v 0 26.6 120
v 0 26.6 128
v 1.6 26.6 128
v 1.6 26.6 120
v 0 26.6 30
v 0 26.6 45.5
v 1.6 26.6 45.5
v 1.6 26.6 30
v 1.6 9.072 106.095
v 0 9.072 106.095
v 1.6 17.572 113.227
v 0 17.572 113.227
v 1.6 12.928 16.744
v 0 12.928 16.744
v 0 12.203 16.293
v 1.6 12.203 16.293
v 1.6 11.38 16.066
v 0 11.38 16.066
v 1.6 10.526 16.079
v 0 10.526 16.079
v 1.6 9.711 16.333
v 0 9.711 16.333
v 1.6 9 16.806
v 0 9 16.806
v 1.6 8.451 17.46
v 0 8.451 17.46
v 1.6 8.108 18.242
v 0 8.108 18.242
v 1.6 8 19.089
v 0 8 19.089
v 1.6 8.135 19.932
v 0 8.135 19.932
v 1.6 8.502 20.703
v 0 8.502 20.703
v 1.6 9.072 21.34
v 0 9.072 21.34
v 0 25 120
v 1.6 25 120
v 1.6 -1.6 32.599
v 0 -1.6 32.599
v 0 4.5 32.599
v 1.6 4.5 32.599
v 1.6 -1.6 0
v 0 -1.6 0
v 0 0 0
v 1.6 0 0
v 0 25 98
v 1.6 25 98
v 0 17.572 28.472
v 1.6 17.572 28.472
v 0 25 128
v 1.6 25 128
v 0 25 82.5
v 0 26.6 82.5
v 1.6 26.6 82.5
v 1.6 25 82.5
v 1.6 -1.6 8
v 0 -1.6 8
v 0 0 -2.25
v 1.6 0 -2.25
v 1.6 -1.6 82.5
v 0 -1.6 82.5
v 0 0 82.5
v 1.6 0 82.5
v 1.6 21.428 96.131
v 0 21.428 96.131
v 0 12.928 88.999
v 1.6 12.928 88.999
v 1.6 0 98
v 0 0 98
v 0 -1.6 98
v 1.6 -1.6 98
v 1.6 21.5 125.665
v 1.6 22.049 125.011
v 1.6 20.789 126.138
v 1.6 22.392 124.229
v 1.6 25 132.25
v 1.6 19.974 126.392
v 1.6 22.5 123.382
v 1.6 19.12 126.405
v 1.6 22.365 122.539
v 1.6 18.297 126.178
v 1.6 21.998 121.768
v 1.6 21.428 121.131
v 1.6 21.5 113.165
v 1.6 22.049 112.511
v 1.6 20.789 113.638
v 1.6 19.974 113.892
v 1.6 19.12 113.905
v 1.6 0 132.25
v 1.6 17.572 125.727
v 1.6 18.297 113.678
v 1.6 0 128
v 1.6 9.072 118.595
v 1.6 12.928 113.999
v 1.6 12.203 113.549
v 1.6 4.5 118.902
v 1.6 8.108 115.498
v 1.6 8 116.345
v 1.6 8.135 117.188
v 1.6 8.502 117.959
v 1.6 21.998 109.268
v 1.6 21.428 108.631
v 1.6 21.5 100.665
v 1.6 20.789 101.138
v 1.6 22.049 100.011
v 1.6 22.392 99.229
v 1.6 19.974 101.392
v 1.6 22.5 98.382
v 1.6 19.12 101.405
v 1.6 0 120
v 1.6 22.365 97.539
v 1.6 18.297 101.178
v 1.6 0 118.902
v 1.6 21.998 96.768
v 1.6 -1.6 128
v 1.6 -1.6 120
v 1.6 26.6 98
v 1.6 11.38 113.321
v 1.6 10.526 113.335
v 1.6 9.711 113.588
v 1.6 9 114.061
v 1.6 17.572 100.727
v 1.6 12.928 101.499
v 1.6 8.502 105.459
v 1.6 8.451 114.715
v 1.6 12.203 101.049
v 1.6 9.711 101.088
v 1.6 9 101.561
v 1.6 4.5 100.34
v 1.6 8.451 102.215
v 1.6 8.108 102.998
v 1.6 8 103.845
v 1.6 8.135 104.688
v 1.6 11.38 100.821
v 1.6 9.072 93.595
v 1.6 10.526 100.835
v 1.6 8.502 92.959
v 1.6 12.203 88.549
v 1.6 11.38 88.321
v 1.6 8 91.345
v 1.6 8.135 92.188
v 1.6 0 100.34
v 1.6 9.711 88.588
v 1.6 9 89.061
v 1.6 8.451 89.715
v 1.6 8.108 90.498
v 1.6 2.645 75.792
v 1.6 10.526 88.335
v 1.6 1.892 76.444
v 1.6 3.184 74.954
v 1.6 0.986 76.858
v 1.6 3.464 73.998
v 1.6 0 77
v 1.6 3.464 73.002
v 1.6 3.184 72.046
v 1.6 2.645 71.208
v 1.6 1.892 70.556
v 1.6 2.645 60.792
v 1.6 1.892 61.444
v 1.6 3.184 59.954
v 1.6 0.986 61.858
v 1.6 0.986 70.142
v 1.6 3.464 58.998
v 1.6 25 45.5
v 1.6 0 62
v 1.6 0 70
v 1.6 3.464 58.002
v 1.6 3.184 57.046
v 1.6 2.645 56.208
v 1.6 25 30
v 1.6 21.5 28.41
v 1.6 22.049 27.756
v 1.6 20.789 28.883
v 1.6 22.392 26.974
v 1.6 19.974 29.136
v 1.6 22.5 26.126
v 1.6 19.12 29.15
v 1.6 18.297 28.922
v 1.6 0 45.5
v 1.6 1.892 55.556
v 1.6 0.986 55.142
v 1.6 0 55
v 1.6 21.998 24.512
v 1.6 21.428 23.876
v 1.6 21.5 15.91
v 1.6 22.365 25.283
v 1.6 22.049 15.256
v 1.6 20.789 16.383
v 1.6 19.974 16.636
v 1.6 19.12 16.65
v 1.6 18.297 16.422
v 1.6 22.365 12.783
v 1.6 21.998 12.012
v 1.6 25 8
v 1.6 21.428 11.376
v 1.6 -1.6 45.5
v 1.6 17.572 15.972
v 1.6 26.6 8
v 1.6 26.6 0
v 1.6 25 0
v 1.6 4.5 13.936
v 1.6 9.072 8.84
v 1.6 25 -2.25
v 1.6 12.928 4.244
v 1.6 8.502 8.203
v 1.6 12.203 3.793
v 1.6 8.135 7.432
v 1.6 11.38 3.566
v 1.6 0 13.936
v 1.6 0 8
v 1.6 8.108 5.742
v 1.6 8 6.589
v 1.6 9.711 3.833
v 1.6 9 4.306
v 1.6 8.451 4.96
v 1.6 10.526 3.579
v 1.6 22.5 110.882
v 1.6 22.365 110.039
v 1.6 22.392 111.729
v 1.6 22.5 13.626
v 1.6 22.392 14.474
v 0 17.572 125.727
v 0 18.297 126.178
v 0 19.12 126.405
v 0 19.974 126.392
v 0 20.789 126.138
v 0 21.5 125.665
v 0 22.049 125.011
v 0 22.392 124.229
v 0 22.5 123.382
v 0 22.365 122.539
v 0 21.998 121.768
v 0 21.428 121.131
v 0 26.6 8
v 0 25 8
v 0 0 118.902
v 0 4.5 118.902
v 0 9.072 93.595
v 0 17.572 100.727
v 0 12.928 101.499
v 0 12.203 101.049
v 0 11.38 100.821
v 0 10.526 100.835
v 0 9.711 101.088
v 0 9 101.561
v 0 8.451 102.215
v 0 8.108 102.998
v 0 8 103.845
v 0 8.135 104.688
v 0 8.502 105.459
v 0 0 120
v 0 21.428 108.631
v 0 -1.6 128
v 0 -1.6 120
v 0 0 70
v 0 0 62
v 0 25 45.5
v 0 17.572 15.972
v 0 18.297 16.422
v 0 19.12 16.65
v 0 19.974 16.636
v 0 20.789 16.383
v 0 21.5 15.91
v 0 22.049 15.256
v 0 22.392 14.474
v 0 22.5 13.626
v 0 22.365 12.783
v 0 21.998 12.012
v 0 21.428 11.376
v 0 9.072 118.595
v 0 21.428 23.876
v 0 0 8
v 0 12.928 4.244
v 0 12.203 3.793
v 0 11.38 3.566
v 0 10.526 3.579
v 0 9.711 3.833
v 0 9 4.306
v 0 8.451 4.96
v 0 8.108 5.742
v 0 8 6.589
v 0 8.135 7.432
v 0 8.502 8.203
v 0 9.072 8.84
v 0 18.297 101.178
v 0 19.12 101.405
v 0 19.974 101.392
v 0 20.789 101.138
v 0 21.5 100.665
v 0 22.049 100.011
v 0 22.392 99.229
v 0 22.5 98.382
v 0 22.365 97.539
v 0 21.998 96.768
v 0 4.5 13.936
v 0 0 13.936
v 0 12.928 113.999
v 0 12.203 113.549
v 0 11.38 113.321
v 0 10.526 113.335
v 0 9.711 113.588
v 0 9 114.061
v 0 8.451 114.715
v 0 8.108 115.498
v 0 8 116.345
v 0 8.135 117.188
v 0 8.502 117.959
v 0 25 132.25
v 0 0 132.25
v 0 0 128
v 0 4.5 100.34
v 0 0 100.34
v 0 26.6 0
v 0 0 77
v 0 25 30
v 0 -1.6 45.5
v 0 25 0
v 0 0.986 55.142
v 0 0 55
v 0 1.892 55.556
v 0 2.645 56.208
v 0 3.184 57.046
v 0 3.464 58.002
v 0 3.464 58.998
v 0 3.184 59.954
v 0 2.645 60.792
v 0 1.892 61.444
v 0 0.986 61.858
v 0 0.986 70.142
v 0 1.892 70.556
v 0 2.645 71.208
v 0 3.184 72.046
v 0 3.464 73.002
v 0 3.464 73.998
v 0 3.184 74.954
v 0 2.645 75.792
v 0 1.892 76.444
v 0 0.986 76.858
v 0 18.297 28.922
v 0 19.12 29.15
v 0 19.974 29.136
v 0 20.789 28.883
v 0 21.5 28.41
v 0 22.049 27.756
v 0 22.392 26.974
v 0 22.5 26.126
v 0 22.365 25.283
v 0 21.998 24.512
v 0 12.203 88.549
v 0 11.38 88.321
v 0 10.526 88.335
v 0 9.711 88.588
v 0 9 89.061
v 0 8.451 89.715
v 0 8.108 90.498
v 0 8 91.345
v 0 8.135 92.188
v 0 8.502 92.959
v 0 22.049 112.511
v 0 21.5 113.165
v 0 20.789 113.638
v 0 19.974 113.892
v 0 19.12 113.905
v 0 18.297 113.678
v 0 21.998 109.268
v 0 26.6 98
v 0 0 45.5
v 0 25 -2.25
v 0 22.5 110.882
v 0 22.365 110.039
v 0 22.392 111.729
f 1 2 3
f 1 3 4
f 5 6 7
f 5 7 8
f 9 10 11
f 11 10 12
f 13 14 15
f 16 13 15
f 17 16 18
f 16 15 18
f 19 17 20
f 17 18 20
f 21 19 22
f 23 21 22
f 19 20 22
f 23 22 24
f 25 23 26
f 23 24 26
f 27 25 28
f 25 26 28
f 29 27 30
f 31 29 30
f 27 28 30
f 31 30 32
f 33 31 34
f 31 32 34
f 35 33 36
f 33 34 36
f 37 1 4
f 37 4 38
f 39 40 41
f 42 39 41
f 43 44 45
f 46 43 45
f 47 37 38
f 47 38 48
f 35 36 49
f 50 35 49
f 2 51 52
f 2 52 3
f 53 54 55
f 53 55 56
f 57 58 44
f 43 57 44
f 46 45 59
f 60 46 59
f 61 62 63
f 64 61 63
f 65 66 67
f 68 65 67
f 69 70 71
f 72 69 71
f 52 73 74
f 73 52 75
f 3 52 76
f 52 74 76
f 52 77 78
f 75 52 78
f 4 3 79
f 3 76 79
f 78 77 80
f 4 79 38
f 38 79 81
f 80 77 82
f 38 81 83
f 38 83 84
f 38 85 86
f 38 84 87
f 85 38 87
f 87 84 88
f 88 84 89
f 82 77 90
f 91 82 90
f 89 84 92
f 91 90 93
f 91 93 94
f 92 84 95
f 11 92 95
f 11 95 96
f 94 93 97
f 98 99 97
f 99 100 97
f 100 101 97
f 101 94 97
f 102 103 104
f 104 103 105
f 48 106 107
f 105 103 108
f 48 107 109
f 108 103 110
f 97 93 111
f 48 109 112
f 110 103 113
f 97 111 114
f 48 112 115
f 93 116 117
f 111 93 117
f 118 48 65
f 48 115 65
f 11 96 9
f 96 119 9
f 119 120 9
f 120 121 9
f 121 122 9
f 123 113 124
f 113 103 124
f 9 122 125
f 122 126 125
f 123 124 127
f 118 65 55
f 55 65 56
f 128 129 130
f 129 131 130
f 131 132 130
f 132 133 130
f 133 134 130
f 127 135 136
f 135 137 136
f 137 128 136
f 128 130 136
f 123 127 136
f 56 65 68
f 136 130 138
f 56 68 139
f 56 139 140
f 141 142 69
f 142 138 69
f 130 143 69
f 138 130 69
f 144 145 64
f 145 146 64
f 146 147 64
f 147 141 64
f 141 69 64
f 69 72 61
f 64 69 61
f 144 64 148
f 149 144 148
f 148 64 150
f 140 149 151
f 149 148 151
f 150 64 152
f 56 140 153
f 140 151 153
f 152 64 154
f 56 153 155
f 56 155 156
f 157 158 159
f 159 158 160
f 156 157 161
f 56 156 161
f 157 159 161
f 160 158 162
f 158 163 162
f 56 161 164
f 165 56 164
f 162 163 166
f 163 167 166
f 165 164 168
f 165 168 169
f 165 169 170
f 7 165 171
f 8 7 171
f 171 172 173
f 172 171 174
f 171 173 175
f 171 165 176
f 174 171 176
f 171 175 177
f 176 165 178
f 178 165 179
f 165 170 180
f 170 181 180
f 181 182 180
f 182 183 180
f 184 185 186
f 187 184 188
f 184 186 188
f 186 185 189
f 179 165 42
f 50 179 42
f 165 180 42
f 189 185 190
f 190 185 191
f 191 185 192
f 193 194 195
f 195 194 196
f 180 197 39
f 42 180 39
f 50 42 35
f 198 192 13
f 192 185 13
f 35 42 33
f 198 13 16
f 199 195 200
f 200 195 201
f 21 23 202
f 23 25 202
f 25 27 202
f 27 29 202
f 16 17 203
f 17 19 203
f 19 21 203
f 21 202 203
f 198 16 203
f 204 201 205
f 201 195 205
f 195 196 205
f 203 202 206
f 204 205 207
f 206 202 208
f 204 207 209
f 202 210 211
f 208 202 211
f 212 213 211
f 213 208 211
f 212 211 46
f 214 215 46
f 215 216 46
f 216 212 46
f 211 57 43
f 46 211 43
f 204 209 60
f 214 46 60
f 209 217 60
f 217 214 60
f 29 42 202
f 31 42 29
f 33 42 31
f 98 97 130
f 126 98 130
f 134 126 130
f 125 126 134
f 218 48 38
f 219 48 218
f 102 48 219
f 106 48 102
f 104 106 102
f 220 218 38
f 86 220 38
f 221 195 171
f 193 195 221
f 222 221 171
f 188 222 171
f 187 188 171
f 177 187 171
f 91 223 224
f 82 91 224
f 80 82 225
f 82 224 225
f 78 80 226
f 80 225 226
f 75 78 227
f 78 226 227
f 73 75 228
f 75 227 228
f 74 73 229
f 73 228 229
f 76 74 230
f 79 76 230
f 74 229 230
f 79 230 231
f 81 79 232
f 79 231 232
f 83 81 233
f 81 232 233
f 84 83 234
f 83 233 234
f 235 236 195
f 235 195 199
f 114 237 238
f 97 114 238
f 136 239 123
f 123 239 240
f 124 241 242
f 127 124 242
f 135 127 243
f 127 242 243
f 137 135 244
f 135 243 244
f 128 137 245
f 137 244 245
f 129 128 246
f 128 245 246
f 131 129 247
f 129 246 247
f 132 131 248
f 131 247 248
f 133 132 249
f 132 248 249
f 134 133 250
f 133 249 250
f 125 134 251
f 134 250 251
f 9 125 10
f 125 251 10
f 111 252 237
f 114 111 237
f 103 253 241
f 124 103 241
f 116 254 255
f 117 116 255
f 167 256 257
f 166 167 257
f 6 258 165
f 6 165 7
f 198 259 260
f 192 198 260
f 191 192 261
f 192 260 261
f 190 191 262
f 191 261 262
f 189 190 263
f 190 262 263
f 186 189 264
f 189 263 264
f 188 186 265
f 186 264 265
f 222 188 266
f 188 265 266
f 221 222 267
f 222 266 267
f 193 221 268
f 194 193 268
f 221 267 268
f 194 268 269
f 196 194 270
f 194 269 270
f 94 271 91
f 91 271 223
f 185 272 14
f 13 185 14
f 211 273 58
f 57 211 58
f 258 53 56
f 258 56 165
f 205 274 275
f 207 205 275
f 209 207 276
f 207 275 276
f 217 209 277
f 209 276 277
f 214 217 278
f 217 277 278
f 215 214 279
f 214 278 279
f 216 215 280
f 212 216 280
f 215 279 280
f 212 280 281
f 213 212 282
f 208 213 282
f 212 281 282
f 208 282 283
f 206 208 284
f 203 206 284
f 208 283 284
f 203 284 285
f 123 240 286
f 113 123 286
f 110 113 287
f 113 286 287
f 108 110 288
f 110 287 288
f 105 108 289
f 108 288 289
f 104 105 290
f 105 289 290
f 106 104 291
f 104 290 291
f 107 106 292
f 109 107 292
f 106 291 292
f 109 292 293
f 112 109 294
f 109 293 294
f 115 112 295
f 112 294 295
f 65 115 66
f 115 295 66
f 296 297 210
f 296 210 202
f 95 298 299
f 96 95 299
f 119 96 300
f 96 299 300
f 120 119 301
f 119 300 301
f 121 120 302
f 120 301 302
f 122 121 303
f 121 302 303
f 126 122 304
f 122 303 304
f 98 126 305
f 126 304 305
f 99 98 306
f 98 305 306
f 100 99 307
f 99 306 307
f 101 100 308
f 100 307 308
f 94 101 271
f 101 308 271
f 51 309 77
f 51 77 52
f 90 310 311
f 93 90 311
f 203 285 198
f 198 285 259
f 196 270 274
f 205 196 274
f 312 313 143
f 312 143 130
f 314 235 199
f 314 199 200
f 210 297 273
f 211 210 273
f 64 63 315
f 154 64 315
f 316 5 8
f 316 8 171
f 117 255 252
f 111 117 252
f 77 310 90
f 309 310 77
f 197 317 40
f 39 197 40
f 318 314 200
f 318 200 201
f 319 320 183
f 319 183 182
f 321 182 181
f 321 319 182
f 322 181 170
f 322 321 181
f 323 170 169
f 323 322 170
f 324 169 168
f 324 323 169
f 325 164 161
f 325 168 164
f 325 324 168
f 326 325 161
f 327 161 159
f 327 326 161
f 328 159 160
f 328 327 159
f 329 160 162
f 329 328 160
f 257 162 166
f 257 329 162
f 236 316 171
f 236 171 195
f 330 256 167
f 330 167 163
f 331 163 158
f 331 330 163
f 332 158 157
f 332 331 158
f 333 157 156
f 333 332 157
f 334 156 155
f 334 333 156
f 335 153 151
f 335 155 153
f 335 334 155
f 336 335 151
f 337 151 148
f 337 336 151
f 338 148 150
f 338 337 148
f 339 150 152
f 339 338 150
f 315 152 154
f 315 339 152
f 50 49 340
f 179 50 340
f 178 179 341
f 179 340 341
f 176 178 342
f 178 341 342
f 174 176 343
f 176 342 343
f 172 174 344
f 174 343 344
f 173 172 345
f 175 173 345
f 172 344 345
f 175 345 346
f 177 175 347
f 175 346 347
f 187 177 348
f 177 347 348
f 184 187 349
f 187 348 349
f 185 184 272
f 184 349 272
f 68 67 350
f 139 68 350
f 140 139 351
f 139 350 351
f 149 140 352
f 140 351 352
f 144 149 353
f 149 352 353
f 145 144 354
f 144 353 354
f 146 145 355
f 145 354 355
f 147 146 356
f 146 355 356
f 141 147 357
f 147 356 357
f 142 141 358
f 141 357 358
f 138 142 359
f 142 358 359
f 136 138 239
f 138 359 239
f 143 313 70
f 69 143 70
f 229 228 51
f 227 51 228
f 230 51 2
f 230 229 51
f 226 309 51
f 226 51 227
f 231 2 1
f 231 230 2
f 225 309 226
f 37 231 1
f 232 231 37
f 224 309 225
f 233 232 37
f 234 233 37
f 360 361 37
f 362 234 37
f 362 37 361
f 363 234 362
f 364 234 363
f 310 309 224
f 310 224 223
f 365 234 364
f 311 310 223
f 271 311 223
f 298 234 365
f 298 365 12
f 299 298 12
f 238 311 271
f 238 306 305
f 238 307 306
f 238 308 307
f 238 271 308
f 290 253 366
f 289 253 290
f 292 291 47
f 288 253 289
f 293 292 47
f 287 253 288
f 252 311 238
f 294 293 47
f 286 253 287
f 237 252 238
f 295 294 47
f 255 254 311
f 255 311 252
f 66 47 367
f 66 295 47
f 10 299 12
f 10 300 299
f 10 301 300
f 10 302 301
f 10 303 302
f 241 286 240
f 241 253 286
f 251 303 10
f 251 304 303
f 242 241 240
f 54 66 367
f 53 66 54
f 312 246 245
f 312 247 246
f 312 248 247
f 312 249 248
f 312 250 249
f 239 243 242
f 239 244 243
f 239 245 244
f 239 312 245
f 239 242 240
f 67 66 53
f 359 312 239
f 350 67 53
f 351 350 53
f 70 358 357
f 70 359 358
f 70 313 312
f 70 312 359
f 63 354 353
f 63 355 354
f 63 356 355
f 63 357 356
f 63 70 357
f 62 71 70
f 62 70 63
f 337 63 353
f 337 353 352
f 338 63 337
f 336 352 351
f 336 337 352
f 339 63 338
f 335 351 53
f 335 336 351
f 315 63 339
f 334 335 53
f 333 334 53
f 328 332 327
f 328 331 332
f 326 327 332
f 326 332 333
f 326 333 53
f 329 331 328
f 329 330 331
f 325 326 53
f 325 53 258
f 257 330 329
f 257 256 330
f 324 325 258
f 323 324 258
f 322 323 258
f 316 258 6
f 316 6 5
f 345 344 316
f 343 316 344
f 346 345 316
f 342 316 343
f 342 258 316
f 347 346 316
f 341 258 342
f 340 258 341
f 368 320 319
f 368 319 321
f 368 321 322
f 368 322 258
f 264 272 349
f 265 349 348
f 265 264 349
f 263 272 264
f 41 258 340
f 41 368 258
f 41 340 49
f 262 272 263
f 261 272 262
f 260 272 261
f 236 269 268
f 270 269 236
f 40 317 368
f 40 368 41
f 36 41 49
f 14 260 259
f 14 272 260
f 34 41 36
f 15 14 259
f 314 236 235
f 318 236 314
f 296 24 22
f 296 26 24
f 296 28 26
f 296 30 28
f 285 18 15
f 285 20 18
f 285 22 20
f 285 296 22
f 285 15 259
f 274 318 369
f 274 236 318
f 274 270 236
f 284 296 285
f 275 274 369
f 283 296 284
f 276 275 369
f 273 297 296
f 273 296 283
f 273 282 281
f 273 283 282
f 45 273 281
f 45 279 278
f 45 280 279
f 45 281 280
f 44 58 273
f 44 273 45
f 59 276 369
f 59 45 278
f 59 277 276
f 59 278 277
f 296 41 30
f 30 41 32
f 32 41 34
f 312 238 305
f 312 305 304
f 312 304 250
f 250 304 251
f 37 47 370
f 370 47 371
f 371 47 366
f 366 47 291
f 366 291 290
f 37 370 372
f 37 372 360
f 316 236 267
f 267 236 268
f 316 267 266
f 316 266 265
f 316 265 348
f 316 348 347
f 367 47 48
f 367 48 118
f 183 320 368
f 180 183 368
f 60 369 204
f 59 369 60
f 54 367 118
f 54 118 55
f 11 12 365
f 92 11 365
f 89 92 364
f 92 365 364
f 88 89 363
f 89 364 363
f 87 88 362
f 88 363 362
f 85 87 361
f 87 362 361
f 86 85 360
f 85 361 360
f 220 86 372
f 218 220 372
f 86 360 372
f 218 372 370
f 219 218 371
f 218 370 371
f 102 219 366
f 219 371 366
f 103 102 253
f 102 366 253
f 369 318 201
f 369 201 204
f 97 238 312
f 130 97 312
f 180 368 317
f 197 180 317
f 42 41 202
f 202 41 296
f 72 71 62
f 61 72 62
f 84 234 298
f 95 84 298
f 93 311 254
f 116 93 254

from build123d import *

# Parameters (mm, degrees)
EXTRUDE_1621_DEPTH     = 1.6
SKETCH3_W              = 18.561492042
SKETCH3_H              = 6.1
SKETCH3_W_2            = 18.663069739
CUT_EXTRUDE_3212_DEPTH = 135.908052021
CUT_EXTRUDE_3564_DEPTH = 1.6


with BuildPart() as part:
    # Sketch1 → Extrude 1621 (new body)
    with BuildSketch(Plane(origin=(0, 0, 0), x_dir=(0, 0, -1), z_dir=(1, 0, 0))):
        Polygon((0, -1.6), (0, 0), (2.25, 0), (2.25, 12.5), (-132.25, 12.5), (-132.25, 0), (-128, 0), (-128, -1.6), (-120, -1.6), (-120, 0), (-98, 0), (-98, -1.6), (-82.5, -1.6), (-82.5, 0), (-45.5, 0), (-45.5, -1.6), (-30, -1.6), (-30, 0), (-8, 0), (-8, -1.6), align=None)
    extrude(amount=EXTRUDE_1621_DEPTH)

    # Mirror1: part across plane


with BuildPart() as part_1:
    add(part.part)
    add(part.part.mirror(Plane(origin=(1.6, 12.5, 0), x_dir=(0, 0, 1), z_dir=(0, 1, 0))))

    # Sketch3 → Cut-Extrude 3212 (cut, through all)
    with BuildSketch(Plane(origin=(0, 0, 0), x_dir=(0, 0, -1), z_dir=(1, 0, 0))):
        with Locations((-109.620995127, 1.45)):
            Rectangle(SKETCH3_W, SKETCH3_H)
        with Locations((-23.26706902, 1.45)):
            Rectangle(SKETCH3_W_2, SKETCH3_H)
        with BuildLine():
            ThreePointArc((-70, 0), (-73.5, 3.5), (-77, 0))
            Line((-77, 0), (-70, 0))
        make_face()
        with BuildLine():
            ThreePointArc((-55, 0), (-58.5, 3.5), (-62, 0))
            Line((-62, 0), (-55, 0))
        make_face()
    extrude(amount=CUT_EXTRUDE_3212_DEPTH, mode=Mode.SUBTRACT)

    # Sketch4 → Cut-Extrude 3564 (cut)
    with BuildSketch(Plane(origin=(0, 0, 0), x_dir=(0, 0, -1), z_dir=(1, 0, 0))):
        with BuildLine():
            Line((-11.375951178, 21.428362829), (-4.243604313, 12.928362829))
            ThreePointArc((-4.243604313, 12.928362829), (-4.613374813, 8.701866671), (-8.839870972, 9.071637171))
            Line((-8.839870972, 9.071637171), (-15.972217837, 17.571637171))
            ThreePointArc((-15.972217837, 17.571637171), (-15.602447336, 21.798133329), (-11.375951178, 21.428362829))
        make_face()
        with BuildLine():
            Line((-121.131197482, 21.428362829), (-113.998850617, 12.928362829))
            ThreePointArc((-113.998850617, 12.928362829), (-114.368621117, 8.701866671), (-118.595117275, 9.071637171))
            Line((-118.595117275, 9.071637171), (-125.72746414, 17.571637171))
            ThreePointArc((-125.72746414, 17.571637171), (-125.35769364, 21.798133329), (-121.131197482, 21.428362829))
        make_face()
        with BuildLine():
            Line((-23.875951178, 21.428362829), (-16.743604313, 12.928362829))
            ThreePointArc((-16.743604313, 12.928362829), (-17.113374813, 8.701866671), (-21.339870972, 9.071637171))
            Line((-21.339870972, 9.071637171), (-28.472217837, 17.571637171))
            ThreePointArc((-28.472217837, 17.571637171), (-28.102447336, 21.798133329), (-23.875951178, 21.428362829))
        make_face()
        with BuildLine():
            Line((-108.631197482, 21.428362829), (-101.498850617, 12.928362829))
            ThreePointArc((-101.498850617, 12.928362829), (-101.868621117, 8.701866671), (-106.095117275, 9.071637171))
            Line((-106.095117275, 9.071637171), (-113.22746414, 17.571637171))
            ThreePointArc((-113.22746414, 17.571637171), (-112.85769364, 21.798133329), (-108.631197482, 21.428362829))
        make_face()
        with BuildLine():
            Line((-96.131197482, 21.428362829), (-88.998850617, 12.928362829))
            ThreePointArc((-88.998850617, 12.928362829), (-89.368621117, 8.701866671), (-93.595117275, 9.071637171))
            Line((-93.595117275, 9.071637171), (-100.72746414, 17.571637171))
            ThreePointArc((-100.72746414, 17.571637171), (-100.35769364, 21.798133329), (-96.131197482, 21.428362829))
        make_face()
    extrude(amount=CUT_EXTRUDE_3564_DEPTH, mode=Mode.SUBTRACT)


solid = part_1.part
